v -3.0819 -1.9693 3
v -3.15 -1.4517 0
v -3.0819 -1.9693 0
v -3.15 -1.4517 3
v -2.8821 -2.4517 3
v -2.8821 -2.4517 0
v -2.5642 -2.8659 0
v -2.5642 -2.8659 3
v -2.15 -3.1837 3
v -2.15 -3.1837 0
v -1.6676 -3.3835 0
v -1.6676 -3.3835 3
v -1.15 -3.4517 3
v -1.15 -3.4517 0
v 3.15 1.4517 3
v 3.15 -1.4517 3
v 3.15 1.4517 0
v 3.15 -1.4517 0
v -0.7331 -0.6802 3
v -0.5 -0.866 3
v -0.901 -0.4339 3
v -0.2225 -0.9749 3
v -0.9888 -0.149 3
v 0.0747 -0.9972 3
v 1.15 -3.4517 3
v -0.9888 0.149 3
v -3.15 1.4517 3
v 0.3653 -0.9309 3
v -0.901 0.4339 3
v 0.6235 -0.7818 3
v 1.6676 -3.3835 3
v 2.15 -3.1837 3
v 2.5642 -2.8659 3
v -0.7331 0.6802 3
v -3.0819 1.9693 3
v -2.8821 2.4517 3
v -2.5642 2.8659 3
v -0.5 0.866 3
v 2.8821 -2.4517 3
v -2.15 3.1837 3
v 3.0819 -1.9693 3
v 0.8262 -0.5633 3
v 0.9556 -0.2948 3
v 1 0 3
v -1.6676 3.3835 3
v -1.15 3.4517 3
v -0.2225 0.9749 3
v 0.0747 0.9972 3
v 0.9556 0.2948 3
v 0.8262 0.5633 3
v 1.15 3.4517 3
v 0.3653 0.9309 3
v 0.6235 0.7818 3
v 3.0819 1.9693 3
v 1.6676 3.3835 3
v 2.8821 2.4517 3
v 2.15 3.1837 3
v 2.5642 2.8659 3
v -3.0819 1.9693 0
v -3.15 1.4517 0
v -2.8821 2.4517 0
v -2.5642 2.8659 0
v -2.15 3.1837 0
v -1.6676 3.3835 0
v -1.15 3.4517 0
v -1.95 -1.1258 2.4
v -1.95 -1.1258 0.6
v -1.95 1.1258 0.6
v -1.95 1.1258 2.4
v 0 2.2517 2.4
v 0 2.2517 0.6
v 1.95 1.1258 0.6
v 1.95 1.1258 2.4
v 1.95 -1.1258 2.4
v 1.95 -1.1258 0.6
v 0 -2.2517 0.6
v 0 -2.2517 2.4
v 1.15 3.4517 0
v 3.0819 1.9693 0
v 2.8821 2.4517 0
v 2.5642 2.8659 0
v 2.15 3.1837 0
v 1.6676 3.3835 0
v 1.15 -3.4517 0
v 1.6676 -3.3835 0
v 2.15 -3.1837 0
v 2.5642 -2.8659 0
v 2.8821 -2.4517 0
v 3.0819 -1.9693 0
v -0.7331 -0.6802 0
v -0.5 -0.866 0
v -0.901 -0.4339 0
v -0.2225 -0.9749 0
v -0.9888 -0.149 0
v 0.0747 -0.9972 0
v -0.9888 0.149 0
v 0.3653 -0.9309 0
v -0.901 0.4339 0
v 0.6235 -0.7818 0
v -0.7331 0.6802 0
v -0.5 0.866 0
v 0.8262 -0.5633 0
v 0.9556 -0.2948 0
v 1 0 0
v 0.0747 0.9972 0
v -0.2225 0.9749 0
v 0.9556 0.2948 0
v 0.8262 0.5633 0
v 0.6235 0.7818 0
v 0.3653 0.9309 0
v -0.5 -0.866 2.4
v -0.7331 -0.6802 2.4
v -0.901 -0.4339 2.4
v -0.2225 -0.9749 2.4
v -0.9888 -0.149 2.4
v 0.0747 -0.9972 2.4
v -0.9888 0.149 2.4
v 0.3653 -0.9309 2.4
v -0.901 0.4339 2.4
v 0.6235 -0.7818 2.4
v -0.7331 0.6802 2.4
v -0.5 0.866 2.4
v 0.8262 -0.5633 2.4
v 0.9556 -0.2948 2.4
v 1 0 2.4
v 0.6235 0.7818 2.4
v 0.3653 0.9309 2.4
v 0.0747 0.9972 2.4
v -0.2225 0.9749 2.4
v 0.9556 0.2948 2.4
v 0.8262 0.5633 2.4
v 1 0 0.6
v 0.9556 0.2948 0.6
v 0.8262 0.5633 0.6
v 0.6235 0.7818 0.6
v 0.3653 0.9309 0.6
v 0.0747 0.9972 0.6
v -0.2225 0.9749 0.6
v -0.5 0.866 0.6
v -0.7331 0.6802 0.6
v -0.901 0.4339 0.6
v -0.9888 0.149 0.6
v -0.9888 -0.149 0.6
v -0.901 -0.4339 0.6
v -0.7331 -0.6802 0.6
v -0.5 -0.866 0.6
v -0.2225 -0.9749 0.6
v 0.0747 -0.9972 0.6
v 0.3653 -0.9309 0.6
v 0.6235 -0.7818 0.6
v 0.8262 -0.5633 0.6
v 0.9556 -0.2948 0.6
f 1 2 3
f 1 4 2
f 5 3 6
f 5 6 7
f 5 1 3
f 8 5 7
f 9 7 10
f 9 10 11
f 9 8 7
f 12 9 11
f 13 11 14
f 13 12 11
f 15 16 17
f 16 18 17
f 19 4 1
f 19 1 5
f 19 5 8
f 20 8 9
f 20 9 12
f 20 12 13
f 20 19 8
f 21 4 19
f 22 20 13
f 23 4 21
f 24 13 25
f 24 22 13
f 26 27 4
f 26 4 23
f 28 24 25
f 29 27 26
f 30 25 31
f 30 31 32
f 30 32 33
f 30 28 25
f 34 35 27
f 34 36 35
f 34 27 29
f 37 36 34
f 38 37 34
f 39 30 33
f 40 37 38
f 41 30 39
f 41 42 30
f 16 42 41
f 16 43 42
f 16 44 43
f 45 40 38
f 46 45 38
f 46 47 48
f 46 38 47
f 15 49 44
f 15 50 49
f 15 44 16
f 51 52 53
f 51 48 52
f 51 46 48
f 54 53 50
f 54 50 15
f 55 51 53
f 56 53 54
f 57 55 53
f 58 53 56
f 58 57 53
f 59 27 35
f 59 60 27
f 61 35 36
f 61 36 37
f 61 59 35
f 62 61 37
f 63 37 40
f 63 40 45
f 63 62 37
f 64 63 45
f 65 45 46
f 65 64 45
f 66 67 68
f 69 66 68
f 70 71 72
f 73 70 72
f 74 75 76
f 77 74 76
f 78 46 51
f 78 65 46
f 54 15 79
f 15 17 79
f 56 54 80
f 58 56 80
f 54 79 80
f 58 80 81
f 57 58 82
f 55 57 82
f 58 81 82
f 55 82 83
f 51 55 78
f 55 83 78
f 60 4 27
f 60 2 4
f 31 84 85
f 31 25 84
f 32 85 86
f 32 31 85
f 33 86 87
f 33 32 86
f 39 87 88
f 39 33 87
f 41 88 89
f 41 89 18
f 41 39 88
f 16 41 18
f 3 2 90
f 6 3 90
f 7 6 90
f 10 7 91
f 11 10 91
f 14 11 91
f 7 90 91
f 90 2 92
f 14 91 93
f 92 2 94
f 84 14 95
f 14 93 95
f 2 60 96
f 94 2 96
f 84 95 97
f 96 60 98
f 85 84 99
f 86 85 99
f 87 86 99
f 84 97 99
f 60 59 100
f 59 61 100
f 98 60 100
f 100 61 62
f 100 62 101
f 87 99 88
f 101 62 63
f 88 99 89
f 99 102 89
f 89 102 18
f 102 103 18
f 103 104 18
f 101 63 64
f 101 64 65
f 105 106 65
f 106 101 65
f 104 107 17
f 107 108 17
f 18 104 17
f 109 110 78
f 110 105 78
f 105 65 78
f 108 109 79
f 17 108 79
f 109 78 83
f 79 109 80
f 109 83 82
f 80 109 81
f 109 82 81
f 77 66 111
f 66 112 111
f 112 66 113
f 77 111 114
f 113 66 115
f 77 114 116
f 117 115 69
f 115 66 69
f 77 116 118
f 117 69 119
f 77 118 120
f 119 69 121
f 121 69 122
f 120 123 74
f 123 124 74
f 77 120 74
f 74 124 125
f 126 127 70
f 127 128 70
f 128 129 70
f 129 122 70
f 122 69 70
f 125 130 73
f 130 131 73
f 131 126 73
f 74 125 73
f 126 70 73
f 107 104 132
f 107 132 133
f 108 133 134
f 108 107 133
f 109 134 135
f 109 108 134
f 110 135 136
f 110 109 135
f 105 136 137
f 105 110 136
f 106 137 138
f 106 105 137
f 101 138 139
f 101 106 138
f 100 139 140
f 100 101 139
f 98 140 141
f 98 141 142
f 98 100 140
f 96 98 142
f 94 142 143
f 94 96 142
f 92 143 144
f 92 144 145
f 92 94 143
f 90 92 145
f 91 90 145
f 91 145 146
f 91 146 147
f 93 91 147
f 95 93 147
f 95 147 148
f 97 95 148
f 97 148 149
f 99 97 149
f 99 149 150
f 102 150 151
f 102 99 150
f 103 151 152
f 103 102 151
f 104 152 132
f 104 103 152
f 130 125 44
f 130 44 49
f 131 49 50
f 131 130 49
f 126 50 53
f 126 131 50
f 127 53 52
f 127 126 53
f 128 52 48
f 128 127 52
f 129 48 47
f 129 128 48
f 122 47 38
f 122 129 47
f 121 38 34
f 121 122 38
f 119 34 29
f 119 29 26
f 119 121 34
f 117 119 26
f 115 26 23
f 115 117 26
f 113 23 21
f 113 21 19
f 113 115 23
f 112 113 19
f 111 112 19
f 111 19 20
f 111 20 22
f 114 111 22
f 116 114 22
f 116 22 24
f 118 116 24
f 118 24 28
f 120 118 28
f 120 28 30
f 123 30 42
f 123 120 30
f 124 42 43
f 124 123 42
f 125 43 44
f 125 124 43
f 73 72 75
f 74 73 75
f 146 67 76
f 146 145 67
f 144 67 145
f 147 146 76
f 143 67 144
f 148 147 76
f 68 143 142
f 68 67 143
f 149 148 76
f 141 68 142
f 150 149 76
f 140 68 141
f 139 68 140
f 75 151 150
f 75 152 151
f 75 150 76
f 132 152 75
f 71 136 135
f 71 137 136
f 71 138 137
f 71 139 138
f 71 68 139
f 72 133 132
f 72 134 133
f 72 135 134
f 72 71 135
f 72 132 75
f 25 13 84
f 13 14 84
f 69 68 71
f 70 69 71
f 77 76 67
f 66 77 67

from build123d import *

# Parameters (mm, degrees)
F0_W     = 6.3
F0_H     = 6.903332
F0_R     = 1
F1_DEPTH = 0.6
F2_W     = 6.3
F2_H     = 6.903332
F3_DEPTH = 1.8
F4_W     = 6.3
F4_H     = 6.903332
F4_R     = 1
F5_DEPTH = 0.6
F6_R     = 2


with BuildPart() as f1:
    # F0 (on Top) → F1 (new body)
    with BuildSketch(Plane.XY):
        Rectangle(F0_W, F0_H)
        Circle(F0_R, mode=Mode.SUBTRACT)
    extrude(amount=F1_DEPTH)

    # F2 (on face) → F3 (join)
    with BuildSketch(Plane.XY.offset(0.6)):
        Rectangle(F2_W, F2_H)
        Polygon((-1.95, 1.125833), (0, 2.251666), (1.95, 1.125833), (1.95, -1.125833), (0, -2.251666), (-1.95, -1.125833), align=None, mode=Mode.SUBTRACT)
    extrude(amount=F3_DEPTH)

    # F4 (on face) → F5 (join)
    with BuildSketch(Plane.XY.offset(2.4)):
        Rectangle(F4_W, F4_H)
        Circle(F4_R, mode=Mode.SUBTRACT)
    extrude(amount=F5_DEPTH)

    # F6
    f6_edges = [f1.edges().sort_by_distance(p)[0] for p in [
        (3.15, -3.451666, 1.5),
        (3.15, 3.451666, 1.5),
        (-3.15, 3.451666, 1.5),
        (-3.15, -3.451666, 1.5),
    ]]
    fillet(f6_edges, radius=F6_R)


solid = f1.part
